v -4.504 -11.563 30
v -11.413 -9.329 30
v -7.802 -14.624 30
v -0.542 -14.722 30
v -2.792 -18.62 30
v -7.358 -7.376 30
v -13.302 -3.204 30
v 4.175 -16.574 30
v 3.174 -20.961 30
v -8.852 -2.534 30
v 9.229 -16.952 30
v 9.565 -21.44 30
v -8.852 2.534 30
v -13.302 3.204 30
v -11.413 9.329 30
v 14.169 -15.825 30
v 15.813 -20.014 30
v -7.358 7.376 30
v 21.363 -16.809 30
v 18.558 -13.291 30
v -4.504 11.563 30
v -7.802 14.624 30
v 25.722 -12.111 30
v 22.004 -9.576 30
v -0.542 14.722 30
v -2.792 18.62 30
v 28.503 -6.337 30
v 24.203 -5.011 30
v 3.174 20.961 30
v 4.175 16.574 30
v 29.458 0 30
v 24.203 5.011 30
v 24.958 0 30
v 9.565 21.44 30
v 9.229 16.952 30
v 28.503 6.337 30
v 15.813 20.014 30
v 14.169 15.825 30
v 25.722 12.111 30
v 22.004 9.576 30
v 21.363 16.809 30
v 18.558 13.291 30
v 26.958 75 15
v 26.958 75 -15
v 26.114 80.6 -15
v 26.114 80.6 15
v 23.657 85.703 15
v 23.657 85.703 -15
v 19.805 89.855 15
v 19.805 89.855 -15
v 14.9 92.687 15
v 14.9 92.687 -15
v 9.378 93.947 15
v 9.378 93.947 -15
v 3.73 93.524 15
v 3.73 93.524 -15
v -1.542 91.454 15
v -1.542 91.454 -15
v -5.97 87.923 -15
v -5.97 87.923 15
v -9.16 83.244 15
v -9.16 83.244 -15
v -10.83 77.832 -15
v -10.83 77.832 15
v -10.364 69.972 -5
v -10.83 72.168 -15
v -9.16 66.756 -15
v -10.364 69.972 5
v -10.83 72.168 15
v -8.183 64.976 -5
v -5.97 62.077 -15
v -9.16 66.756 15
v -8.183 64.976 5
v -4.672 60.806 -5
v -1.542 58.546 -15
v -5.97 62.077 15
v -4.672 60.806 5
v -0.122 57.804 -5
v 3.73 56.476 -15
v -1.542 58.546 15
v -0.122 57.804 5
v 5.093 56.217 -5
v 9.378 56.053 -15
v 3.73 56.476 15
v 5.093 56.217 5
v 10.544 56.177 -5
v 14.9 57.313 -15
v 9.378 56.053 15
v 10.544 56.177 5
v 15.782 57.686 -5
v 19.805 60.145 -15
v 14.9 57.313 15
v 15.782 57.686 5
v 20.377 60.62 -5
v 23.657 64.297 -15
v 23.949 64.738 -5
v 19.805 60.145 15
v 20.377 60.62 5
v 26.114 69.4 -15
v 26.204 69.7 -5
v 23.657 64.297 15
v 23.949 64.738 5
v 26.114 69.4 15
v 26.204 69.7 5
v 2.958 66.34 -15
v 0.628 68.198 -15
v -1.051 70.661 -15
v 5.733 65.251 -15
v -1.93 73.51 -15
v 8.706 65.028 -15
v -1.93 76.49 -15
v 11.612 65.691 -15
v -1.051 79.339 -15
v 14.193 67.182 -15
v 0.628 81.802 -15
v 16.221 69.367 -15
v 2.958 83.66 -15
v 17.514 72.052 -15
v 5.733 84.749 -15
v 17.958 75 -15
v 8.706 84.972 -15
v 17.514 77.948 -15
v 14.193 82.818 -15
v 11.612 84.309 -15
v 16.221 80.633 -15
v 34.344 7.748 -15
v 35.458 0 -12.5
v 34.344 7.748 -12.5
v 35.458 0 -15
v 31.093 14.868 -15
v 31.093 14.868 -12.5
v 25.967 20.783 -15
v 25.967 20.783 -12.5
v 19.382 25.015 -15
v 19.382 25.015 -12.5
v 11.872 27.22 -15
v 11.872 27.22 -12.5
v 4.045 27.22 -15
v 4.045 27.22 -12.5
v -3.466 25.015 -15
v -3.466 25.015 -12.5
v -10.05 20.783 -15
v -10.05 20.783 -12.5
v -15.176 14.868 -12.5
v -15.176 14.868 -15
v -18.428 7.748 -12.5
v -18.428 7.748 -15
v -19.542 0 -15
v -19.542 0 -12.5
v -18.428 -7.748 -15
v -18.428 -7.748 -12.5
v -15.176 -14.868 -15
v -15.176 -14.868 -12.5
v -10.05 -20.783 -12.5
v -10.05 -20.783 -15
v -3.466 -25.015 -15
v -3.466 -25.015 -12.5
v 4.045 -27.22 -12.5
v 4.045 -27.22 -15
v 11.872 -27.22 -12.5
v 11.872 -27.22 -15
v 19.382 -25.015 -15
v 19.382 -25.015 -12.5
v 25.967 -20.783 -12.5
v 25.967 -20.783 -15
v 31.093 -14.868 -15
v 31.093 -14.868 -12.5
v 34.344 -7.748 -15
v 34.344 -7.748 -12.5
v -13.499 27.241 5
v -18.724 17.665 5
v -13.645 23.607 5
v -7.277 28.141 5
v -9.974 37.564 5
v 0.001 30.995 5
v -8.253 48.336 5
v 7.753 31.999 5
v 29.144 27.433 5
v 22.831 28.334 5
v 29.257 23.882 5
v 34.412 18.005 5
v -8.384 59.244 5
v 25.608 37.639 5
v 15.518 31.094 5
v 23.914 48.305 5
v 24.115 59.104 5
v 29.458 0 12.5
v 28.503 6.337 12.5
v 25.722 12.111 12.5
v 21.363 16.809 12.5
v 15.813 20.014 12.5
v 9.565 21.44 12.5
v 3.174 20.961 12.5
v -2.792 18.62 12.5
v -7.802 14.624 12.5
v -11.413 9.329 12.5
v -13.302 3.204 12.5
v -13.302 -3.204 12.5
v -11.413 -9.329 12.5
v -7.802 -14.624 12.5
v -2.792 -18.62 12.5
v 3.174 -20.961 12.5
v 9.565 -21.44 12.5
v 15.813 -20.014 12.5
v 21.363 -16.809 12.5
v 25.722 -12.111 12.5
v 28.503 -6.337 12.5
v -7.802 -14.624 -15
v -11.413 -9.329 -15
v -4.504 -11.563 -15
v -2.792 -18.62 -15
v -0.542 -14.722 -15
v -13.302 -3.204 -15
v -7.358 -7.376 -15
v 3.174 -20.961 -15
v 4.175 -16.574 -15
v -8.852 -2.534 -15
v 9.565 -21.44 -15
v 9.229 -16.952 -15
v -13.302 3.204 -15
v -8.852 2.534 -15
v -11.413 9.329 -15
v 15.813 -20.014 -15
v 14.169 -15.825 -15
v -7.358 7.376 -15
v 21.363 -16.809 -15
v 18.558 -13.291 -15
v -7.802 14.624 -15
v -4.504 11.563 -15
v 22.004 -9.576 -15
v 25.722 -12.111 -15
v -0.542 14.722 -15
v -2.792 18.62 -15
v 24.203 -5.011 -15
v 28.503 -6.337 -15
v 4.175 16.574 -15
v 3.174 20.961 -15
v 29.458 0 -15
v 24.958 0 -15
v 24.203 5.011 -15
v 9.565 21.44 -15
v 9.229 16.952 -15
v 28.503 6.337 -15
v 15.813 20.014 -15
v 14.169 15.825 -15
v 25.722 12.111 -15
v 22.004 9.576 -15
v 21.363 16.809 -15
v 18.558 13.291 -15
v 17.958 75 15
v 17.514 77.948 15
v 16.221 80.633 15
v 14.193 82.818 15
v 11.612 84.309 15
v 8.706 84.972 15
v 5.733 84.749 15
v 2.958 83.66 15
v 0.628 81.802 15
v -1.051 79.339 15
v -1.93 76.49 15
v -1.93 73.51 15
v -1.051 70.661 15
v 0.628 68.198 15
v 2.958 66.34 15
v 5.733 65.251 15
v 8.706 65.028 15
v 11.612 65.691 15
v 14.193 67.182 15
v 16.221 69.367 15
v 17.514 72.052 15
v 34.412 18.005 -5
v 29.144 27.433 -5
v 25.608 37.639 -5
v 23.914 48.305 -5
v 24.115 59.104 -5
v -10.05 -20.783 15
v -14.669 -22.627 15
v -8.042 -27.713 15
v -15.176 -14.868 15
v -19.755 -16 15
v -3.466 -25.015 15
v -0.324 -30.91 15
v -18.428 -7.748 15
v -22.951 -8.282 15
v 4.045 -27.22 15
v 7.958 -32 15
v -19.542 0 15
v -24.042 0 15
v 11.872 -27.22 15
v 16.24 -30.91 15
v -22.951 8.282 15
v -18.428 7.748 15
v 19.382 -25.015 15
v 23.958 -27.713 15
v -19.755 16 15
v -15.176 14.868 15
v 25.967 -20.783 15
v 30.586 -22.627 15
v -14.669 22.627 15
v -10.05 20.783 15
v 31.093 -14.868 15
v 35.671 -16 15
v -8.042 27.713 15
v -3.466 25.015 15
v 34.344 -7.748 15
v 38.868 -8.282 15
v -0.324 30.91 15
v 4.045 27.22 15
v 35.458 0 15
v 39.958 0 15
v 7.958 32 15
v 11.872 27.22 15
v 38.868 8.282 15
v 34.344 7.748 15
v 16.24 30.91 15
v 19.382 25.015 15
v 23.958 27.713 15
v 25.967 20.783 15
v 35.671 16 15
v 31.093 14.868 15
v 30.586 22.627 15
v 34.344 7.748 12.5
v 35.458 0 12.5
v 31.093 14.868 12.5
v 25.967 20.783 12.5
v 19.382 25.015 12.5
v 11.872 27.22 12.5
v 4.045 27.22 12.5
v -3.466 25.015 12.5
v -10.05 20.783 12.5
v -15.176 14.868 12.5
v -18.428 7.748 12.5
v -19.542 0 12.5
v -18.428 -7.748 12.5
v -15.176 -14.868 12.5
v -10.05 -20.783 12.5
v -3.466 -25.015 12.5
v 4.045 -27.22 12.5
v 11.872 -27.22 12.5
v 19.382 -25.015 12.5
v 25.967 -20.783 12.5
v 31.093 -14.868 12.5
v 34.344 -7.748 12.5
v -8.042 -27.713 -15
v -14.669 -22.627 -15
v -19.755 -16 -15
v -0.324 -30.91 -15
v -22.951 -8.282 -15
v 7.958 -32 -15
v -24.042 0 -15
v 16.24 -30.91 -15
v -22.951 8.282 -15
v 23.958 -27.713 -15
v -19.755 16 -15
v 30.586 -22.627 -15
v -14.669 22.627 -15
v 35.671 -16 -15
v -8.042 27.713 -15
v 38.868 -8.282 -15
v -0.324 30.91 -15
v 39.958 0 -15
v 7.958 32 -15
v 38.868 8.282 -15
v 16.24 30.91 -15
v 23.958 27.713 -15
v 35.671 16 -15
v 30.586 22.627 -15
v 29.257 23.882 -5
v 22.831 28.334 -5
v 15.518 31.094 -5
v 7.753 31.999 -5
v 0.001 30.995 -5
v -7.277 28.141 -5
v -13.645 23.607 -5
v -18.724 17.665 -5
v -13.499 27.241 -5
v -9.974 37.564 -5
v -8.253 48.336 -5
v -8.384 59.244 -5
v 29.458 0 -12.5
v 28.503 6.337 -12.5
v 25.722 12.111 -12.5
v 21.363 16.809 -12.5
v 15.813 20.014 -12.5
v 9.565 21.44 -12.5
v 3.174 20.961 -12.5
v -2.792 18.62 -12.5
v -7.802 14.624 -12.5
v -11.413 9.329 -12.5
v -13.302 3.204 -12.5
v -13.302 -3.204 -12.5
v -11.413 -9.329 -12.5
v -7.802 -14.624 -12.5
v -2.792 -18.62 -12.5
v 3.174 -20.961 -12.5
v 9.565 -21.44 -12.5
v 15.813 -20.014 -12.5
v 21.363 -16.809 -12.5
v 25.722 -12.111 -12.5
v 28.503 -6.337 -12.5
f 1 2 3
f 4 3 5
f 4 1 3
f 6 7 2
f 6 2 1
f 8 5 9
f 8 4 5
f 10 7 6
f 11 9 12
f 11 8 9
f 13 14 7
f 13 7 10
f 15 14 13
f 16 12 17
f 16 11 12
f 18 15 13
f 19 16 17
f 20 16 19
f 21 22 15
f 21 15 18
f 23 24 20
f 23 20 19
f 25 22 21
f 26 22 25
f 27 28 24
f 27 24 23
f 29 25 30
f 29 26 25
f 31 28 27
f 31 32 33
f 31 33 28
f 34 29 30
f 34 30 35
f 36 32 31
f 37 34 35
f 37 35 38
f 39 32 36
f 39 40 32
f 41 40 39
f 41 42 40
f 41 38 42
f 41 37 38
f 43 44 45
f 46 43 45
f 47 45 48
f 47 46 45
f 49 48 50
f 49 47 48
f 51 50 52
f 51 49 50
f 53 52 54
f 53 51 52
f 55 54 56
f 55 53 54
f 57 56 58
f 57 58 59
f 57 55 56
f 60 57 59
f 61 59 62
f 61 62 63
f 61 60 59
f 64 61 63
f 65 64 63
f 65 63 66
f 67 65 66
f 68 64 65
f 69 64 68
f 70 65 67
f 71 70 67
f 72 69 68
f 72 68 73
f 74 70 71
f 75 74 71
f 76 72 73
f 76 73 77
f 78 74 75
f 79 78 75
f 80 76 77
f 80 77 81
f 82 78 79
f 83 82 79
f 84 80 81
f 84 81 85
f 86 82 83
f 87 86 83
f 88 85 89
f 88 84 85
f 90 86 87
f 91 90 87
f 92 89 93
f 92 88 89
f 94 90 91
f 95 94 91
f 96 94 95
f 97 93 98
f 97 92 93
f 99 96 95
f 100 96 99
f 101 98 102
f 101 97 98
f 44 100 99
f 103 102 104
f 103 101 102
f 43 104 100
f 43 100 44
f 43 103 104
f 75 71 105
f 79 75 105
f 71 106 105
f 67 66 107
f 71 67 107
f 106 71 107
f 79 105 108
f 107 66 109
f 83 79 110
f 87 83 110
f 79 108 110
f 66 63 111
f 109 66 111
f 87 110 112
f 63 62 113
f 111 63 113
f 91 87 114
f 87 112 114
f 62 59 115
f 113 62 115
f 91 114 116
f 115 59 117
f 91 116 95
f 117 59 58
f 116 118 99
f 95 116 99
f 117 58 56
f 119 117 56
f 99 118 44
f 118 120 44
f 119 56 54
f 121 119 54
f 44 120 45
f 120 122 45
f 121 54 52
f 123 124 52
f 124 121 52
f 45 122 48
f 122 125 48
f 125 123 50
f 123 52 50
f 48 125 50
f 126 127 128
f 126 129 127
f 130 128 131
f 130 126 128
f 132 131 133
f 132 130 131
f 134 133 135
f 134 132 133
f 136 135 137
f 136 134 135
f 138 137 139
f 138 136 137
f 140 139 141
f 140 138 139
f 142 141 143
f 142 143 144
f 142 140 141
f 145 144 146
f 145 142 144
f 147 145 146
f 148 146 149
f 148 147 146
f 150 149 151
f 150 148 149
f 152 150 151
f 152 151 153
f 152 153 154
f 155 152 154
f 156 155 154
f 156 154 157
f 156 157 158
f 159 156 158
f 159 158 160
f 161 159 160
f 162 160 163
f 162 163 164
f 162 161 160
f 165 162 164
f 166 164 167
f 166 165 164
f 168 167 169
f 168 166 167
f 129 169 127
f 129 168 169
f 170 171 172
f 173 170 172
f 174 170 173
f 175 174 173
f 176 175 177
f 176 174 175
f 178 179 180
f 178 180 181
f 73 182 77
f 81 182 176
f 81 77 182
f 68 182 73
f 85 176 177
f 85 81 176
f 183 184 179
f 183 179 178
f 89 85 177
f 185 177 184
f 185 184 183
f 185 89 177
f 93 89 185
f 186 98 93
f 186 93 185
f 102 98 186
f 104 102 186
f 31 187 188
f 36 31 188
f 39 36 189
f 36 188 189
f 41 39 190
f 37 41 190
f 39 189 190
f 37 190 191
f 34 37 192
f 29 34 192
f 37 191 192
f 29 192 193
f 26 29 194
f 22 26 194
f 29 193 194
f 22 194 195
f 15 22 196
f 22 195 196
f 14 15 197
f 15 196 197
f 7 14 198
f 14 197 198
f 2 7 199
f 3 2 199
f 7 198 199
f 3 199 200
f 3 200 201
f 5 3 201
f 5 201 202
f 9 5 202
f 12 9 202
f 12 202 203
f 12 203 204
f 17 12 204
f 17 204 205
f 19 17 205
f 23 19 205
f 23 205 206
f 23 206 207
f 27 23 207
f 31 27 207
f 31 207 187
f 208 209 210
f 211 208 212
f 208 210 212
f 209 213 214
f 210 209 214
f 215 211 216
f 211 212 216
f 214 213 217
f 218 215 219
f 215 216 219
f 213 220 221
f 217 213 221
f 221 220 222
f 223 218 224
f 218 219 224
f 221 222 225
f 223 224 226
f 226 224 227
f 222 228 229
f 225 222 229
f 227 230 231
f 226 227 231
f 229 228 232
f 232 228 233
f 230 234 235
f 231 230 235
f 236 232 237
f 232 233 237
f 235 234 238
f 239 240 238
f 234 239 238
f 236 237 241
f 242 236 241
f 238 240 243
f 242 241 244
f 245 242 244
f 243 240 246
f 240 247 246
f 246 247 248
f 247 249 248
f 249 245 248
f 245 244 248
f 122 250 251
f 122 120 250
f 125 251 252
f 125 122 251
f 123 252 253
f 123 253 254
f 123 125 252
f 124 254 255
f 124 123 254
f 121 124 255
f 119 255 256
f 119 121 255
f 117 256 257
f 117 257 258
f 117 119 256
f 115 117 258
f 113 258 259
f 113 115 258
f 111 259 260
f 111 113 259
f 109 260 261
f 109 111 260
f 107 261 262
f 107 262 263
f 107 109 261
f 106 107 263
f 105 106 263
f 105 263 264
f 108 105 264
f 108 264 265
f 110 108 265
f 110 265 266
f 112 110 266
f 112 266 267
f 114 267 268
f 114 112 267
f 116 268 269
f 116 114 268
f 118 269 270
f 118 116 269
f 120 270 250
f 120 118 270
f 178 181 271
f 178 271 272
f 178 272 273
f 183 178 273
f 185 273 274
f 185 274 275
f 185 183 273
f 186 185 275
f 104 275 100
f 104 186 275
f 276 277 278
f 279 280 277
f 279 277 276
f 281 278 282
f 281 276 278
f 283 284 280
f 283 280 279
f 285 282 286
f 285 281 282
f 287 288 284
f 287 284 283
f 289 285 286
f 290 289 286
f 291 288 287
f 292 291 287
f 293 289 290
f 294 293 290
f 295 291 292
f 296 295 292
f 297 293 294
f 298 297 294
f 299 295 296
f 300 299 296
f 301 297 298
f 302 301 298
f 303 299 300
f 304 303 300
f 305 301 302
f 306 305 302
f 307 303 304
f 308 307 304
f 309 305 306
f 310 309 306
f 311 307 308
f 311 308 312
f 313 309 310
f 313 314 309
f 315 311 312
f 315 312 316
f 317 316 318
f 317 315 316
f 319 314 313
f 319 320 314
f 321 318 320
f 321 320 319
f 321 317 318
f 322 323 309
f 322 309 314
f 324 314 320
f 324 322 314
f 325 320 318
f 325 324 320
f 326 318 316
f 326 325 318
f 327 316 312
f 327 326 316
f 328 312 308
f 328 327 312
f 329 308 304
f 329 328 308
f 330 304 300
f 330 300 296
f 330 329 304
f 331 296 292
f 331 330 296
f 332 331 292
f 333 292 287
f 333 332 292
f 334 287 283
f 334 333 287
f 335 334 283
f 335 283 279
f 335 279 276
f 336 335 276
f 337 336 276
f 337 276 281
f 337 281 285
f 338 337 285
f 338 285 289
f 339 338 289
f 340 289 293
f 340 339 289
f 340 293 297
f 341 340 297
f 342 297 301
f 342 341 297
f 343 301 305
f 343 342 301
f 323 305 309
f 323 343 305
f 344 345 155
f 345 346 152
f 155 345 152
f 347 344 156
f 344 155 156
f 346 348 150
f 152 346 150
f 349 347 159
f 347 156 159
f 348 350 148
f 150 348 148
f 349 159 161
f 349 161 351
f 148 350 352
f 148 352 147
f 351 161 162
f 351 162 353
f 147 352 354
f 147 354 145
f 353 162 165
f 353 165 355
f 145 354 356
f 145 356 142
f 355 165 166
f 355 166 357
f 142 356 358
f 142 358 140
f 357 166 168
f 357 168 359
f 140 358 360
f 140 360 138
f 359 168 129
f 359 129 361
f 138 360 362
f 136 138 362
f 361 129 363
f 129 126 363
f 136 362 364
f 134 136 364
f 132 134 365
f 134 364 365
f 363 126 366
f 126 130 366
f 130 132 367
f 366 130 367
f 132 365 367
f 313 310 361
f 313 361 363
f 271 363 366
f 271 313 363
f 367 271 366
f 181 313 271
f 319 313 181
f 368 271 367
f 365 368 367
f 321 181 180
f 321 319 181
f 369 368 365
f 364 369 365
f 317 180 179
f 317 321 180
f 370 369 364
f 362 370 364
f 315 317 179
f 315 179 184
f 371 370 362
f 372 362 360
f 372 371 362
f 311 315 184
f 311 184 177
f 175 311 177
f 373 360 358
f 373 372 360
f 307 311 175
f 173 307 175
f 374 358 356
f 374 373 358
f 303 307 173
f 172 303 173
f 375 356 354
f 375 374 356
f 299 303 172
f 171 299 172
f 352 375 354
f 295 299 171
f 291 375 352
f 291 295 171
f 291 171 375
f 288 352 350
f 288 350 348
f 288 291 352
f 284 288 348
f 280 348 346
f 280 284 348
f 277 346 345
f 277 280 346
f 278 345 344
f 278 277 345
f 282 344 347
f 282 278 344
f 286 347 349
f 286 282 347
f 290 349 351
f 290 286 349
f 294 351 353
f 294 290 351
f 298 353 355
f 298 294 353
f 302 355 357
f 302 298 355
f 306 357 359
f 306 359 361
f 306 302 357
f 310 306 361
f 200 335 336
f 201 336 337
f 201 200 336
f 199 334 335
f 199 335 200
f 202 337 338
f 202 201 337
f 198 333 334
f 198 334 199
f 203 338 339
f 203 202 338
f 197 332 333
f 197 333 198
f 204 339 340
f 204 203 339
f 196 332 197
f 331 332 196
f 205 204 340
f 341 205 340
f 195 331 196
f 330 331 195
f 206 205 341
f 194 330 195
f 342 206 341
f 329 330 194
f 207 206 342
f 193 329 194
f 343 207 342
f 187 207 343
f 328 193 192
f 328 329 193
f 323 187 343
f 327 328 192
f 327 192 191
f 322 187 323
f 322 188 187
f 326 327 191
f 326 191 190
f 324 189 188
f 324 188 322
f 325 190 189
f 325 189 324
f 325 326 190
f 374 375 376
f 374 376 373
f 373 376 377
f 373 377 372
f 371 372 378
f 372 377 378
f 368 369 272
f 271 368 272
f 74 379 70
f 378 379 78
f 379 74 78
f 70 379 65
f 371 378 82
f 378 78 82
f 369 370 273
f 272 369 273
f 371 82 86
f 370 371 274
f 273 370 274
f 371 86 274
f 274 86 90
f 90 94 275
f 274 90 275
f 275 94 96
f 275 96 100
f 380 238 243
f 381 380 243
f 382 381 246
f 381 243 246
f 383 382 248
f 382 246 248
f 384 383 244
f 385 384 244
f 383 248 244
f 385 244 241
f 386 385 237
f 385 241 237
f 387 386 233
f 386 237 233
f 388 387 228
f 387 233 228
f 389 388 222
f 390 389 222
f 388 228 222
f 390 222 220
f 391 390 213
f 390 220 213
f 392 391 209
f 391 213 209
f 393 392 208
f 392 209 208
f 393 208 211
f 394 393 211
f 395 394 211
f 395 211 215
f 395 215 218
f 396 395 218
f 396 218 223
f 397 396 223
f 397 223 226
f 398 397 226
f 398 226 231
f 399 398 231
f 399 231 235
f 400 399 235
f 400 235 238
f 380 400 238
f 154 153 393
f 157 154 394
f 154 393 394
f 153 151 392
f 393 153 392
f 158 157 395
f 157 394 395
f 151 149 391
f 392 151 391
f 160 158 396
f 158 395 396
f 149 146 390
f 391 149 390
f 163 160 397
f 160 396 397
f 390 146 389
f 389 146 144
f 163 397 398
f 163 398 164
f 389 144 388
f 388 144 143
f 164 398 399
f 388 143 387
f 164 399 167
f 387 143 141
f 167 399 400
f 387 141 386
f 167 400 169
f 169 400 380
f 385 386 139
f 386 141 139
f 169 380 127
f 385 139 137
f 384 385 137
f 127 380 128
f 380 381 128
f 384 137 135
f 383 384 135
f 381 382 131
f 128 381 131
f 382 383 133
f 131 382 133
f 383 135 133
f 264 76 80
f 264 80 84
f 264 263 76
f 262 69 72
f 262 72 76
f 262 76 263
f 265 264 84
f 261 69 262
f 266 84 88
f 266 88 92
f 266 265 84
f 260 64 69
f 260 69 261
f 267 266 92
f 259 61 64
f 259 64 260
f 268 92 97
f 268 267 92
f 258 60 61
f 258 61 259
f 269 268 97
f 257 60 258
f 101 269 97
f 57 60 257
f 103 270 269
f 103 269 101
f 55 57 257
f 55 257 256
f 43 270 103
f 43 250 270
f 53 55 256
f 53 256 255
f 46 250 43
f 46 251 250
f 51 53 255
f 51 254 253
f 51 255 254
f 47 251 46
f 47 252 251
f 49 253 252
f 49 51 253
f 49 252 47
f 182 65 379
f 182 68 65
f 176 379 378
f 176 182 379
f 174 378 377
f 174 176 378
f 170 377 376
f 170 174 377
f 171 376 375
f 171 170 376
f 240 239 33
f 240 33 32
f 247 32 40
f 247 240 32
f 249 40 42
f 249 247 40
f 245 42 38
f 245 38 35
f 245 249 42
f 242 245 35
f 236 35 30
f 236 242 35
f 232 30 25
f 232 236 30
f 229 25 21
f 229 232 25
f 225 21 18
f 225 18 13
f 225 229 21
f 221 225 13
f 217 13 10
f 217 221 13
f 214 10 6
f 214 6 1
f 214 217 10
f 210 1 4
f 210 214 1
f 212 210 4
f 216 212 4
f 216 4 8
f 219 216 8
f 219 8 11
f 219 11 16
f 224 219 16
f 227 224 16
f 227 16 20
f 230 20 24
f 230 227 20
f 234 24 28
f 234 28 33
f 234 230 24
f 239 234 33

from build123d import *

# Parameters (mm, degrees)
BOSS_EXTRUDE1_DEPTH      = 5
SKETCH2_3_R              = 19
SKETCH2_3_R_2            = 10
BOSS_EXTRUDE2_DEPTH      = 15
SKETCH2_5_R              = 32
SKETCH2_5_R_2            = 27.5
BOSS_EXTRUDE3_DEPTH      = 15
BOSS_EXTRUDE4_DEPTH      = 30
BOSS_EXTRUDE4_DEPTH_BACK = 15
SKETCH2_6_R              = 21.5
SKETCH2_6_R_2            = 17
SKETCH2_7_R              = 27.5
SKETCH2_7_R_2            = 21.5
BOSS_EXTRUDE5_DEPTH      = 12.5


with BuildPart() as part:
    # Sketch2 → Boss-Extrude1 (new, symmetric)
    with BuildSketch(Plane.XY):
        with BuildLine():
            ThreePointArc((-18.724325041, 17.664638492), (7.753239465, 31.999343197), (34.412311606, 18.005092456))
            ThreePointArc((34.412311606, 18.005092456), (24.526384504, 42.934747234), (26.204222758, 69.700473468))
            ThreePointArc((26.204222758, 69.700473468), (7.817165129, 56.000523924), (-10.364391673, 69.972048465))
            ThreePointArc((-10.364391673, 69.972048465), (-8.883681263, 42.913636414), (-18.724325041, 17.664638492))
        make_face()
    extrude(amount=BOSS_EXTRUDE1_DEPTH, both=True)

    # Sketch2<3> → Boss-Extrude2 (add, symmetric)
    with BuildSketch(Plane.XY):
        with Locations((7.958263794, 75)):
            Circle(SKETCH2_3_R)
        with Locations((7.958263794, 75)):
            Circle(SKETCH2_3_R_2, mode=Mode.SUBTRACT)
    extrude(amount=BOSS_EXTRUDE2_DEPTH, both=True)

    # Sketch2<5> → Boss-Extrude3 (add, symmetric)
    with BuildSketch(Plane.XY):
        with Locations((7.958263794, 0)):
            Circle(SKETCH2_5_R)
        with Locations((7.958263794, 0)):
            Circle(SKETCH2_5_R_2, mode=Mode.SUBTRACT)
    extrude(amount=BOSS_EXTRUDE3_DEPTH, both=True)



with BuildPart() as body_2:
    # Sketch2<6> → Boss-Extrude4 (new, two sides: drawn at the far end of the back side and taken through both)
    with BuildSketch(Plane.XY.offset(-BOSS_EXTRUDE4_DEPTH_BACK)):
        with Locations((7.958263794, 0)):
            Circle(SKETCH2_6_R)
        with Locations((7.958263794, 0)):
            Circle(SKETCH2_6_R_2, mode=Mode.SUBTRACT)
    extrude(amount=BOSS_EXTRUDE4_DEPTH + BOSS_EXTRUDE4_DEPTH_BACK)


with BuildPart() as part_1:
    add(part.part)

    add(body_2.part)  # Boss-Extrude5 merges body 2
    # Sketch2<7> → Boss-Extrude5 (add, symmetric)
    with BuildSketch(Plane.XY):
        with Locations((7.958263794, 0)):
            Circle(SKETCH2_7_R)
        with Locations((7.958263794, 0)):
            Circle(SKETCH2_7_R_2, mode=Mode.SUBTRACT)
    extrude(amount=BOSS_EXTRUDE5_DEPTH, both=True)


solid = part_1.part
